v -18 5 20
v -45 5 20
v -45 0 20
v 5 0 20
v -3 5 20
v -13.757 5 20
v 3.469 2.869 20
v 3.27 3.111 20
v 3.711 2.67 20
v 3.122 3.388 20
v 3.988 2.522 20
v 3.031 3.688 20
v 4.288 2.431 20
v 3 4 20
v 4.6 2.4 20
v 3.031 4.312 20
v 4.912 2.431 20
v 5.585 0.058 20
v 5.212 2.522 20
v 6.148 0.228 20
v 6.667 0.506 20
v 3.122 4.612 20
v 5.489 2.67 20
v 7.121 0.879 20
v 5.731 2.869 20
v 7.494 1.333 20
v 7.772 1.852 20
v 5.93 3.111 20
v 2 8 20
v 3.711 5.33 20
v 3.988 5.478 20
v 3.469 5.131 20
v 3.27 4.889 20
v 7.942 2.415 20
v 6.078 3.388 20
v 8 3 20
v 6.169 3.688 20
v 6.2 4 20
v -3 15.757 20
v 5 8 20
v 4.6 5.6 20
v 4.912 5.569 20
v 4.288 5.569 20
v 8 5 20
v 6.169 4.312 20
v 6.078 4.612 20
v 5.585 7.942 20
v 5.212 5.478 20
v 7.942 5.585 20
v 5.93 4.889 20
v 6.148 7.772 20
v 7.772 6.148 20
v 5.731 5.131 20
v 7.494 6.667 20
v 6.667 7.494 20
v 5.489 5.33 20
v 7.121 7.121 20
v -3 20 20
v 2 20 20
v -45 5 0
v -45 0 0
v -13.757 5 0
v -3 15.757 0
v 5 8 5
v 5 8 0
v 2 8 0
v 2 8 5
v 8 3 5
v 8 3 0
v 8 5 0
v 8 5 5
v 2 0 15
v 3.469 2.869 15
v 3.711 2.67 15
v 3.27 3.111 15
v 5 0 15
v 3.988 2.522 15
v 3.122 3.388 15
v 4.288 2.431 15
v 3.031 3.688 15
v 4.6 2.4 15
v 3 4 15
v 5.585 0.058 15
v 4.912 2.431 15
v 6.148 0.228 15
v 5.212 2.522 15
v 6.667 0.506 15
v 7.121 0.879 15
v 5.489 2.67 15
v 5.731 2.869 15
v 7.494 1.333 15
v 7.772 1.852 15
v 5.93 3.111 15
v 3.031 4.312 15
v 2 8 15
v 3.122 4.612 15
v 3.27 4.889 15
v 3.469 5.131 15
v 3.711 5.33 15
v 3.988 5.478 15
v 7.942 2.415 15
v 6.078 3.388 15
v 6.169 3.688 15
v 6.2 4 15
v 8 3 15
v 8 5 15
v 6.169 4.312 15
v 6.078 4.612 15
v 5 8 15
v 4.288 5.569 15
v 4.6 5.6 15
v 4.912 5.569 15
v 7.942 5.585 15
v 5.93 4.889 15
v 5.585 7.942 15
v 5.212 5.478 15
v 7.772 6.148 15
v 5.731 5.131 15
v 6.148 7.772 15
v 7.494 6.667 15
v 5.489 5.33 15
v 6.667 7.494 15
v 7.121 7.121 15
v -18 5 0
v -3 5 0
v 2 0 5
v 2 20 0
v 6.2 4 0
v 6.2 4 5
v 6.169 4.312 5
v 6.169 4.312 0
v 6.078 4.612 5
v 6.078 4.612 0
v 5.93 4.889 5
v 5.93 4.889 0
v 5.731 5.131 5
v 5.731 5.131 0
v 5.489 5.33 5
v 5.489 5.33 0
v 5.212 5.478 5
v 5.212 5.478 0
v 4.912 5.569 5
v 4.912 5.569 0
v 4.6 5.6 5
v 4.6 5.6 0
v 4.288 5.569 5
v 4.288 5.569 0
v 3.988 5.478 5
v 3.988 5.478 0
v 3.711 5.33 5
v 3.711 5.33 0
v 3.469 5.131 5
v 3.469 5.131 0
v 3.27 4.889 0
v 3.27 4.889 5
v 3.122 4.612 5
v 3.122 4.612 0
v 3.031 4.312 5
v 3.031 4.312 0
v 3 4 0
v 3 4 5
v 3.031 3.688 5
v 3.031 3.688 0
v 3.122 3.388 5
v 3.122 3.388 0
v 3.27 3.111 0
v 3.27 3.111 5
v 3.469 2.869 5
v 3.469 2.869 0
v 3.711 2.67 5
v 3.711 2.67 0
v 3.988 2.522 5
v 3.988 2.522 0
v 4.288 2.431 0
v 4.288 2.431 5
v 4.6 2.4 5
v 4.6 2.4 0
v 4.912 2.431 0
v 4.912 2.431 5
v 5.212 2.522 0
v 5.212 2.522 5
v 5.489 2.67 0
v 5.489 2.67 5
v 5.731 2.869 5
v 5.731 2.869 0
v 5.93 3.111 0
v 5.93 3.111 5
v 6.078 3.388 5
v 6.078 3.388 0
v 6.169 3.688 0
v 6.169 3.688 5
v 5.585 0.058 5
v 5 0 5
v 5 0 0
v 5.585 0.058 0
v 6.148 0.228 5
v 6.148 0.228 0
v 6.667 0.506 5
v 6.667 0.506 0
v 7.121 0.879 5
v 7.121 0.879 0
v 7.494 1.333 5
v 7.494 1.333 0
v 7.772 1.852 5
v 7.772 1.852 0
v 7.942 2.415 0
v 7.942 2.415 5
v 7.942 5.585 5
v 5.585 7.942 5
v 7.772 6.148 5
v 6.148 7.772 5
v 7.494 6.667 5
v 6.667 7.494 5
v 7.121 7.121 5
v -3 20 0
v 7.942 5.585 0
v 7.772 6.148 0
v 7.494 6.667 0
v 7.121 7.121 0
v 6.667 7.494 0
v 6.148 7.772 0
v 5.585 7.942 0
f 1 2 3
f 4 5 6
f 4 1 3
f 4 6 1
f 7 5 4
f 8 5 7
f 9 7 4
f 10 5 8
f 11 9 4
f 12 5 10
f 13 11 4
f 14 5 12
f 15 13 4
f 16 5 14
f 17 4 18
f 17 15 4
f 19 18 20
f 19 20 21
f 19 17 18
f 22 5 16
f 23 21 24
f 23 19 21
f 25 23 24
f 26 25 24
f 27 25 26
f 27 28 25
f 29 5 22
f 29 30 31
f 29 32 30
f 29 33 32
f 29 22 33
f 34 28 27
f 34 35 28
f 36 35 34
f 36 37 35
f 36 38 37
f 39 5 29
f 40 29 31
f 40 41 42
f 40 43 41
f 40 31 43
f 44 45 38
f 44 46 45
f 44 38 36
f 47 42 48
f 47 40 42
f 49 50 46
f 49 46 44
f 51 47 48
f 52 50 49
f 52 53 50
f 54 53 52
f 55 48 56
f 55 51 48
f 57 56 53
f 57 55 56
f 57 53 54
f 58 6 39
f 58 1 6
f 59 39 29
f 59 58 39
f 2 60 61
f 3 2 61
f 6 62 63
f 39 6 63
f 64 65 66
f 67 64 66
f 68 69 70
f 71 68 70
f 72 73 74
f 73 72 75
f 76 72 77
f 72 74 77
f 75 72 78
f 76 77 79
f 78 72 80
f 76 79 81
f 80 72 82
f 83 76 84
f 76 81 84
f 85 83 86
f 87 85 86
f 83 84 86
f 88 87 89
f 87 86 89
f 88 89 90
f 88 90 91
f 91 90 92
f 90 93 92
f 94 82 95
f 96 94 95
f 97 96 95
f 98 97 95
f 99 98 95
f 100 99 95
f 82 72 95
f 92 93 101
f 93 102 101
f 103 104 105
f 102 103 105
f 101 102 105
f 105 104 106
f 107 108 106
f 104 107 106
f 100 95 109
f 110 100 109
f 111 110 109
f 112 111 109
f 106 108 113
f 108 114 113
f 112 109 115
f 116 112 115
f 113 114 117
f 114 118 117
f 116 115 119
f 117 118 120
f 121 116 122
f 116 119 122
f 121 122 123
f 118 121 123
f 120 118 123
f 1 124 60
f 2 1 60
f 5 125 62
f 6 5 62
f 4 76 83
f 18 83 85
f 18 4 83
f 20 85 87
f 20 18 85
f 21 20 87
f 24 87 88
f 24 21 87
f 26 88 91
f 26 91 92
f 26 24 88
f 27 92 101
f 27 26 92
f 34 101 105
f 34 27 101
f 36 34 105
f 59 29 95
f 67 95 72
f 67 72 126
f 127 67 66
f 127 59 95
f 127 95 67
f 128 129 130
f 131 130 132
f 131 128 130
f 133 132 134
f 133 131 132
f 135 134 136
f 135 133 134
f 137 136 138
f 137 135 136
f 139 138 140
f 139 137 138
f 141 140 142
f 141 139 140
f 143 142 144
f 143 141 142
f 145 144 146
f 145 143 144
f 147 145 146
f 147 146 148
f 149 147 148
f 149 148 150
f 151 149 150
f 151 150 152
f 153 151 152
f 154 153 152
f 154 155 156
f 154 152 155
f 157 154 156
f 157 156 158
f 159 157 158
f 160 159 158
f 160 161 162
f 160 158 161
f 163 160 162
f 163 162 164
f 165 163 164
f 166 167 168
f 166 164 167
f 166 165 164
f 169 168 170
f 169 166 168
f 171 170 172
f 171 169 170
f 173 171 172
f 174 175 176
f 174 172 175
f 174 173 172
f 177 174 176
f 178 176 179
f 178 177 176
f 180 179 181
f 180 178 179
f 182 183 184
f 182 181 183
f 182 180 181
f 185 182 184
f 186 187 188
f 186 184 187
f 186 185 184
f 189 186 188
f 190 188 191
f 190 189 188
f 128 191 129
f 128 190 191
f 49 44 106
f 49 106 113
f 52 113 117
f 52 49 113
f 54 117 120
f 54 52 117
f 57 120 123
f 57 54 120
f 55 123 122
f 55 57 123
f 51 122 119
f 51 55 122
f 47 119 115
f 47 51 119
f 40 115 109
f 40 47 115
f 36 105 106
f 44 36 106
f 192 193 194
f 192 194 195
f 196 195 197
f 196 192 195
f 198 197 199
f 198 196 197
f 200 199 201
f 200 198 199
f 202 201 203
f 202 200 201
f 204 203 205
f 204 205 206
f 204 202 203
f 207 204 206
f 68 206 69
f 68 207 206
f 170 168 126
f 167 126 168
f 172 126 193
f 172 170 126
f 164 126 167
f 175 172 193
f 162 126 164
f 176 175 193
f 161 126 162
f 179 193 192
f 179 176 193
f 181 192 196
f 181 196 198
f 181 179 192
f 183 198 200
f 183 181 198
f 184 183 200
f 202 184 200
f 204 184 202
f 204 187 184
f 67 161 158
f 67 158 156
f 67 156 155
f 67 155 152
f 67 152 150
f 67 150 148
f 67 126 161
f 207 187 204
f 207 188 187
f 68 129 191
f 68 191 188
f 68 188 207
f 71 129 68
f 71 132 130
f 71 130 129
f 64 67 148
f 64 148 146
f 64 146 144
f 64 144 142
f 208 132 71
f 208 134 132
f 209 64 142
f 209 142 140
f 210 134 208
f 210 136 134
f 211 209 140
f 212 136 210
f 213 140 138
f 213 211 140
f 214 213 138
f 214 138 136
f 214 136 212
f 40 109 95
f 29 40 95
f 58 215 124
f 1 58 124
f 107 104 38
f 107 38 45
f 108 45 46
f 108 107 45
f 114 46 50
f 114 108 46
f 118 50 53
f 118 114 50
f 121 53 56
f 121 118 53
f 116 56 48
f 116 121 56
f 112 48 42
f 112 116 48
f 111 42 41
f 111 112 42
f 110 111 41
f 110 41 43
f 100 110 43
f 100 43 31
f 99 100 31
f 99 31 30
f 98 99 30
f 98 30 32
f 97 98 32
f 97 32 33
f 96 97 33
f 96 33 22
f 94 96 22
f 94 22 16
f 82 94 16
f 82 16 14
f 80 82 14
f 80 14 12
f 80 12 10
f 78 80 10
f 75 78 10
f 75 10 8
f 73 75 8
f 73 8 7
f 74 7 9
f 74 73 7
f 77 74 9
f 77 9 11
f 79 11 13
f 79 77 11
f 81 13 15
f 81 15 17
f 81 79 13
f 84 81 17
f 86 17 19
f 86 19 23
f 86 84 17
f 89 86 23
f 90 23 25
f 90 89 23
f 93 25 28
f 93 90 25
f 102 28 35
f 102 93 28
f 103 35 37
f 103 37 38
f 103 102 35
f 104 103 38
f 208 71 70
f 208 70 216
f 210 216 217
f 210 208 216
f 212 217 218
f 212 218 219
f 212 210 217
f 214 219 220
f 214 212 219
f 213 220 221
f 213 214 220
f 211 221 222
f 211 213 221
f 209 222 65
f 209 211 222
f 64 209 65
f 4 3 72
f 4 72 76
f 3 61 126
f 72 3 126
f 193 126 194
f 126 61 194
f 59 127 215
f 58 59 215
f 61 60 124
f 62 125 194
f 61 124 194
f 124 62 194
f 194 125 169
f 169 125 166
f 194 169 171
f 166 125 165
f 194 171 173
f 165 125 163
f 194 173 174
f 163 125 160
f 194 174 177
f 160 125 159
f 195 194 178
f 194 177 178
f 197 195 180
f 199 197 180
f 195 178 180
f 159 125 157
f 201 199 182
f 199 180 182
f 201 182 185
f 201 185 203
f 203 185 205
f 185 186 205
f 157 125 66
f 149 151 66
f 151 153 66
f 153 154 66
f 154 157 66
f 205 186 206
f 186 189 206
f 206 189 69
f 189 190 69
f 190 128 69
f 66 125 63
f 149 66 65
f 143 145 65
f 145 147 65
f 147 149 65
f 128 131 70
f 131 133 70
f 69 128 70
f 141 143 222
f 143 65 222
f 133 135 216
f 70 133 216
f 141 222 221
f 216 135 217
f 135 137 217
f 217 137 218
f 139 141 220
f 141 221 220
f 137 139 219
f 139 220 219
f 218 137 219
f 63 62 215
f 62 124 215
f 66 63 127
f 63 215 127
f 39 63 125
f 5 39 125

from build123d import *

# Parameters (mm, degrees)
SKETCH2_R           = 1.6
BOSS_EXTRUDE1_DEPTH = 20
FILLET1_R           = 3
CUT_EXTRUDE1_REACH  = 52.685
SKETCH3_W           = 6
SKETCH3_H           = 10


with BuildPart() as part:
    # Sketch2 → Boss-Extrude1 (new body)
    with BuildSketch(Plane.XY):
        Polygon((-45, 0), (0, 0), (8, 0), (8, 8), (2, 8), (2, 20), (-3, 20), (-18, 5), (-45, 5), align=None)
        with Locations((4.6, 4)):
            Circle(SKETCH2_R, mode=Mode.SUBTRACT)
        Polygon((-3, 5), (-13.757359313, 5), (-3, 15.757359313), align=None, mode=Mode.SUBTRACT)
    extrude(amount=BOSS_EXTRUDE1_DEPTH)

    # Fillet1
    fillet1_edges = [part.edges().sort_by_distance(p)[0] for p in [
        (8, 8, 10),
        (8, 0, 10),
    ]]
    fillet(fillet1_edges, radius=FILLET1_R)

    # Sketch3 → Cut-Extrude1 (cut, up to next)
    with BuildSketch(Plane(origin=(0, 8, 0), x_dir=(1, 0, 0), z_dir=(0, 1, 0)), mode=Mode.PRIVATE) as cut_extrude1_sk1:
        with Locations((5, -10)):
            Rectangle(SKETCH3_W, SKETCH3_H)
    cut_extrude1_tool1 = extrude(cut_extrude1_sk1.sketch, amount=-CUT_EXTRUDE1_REACH, mode=Mode.PRIVATE) & part.part
    add(cut_extrude1_tool1.solids().sort_by_distance((5, 8, 10))[0], mode=Mode.SUBTRACT)


solid = part.part
